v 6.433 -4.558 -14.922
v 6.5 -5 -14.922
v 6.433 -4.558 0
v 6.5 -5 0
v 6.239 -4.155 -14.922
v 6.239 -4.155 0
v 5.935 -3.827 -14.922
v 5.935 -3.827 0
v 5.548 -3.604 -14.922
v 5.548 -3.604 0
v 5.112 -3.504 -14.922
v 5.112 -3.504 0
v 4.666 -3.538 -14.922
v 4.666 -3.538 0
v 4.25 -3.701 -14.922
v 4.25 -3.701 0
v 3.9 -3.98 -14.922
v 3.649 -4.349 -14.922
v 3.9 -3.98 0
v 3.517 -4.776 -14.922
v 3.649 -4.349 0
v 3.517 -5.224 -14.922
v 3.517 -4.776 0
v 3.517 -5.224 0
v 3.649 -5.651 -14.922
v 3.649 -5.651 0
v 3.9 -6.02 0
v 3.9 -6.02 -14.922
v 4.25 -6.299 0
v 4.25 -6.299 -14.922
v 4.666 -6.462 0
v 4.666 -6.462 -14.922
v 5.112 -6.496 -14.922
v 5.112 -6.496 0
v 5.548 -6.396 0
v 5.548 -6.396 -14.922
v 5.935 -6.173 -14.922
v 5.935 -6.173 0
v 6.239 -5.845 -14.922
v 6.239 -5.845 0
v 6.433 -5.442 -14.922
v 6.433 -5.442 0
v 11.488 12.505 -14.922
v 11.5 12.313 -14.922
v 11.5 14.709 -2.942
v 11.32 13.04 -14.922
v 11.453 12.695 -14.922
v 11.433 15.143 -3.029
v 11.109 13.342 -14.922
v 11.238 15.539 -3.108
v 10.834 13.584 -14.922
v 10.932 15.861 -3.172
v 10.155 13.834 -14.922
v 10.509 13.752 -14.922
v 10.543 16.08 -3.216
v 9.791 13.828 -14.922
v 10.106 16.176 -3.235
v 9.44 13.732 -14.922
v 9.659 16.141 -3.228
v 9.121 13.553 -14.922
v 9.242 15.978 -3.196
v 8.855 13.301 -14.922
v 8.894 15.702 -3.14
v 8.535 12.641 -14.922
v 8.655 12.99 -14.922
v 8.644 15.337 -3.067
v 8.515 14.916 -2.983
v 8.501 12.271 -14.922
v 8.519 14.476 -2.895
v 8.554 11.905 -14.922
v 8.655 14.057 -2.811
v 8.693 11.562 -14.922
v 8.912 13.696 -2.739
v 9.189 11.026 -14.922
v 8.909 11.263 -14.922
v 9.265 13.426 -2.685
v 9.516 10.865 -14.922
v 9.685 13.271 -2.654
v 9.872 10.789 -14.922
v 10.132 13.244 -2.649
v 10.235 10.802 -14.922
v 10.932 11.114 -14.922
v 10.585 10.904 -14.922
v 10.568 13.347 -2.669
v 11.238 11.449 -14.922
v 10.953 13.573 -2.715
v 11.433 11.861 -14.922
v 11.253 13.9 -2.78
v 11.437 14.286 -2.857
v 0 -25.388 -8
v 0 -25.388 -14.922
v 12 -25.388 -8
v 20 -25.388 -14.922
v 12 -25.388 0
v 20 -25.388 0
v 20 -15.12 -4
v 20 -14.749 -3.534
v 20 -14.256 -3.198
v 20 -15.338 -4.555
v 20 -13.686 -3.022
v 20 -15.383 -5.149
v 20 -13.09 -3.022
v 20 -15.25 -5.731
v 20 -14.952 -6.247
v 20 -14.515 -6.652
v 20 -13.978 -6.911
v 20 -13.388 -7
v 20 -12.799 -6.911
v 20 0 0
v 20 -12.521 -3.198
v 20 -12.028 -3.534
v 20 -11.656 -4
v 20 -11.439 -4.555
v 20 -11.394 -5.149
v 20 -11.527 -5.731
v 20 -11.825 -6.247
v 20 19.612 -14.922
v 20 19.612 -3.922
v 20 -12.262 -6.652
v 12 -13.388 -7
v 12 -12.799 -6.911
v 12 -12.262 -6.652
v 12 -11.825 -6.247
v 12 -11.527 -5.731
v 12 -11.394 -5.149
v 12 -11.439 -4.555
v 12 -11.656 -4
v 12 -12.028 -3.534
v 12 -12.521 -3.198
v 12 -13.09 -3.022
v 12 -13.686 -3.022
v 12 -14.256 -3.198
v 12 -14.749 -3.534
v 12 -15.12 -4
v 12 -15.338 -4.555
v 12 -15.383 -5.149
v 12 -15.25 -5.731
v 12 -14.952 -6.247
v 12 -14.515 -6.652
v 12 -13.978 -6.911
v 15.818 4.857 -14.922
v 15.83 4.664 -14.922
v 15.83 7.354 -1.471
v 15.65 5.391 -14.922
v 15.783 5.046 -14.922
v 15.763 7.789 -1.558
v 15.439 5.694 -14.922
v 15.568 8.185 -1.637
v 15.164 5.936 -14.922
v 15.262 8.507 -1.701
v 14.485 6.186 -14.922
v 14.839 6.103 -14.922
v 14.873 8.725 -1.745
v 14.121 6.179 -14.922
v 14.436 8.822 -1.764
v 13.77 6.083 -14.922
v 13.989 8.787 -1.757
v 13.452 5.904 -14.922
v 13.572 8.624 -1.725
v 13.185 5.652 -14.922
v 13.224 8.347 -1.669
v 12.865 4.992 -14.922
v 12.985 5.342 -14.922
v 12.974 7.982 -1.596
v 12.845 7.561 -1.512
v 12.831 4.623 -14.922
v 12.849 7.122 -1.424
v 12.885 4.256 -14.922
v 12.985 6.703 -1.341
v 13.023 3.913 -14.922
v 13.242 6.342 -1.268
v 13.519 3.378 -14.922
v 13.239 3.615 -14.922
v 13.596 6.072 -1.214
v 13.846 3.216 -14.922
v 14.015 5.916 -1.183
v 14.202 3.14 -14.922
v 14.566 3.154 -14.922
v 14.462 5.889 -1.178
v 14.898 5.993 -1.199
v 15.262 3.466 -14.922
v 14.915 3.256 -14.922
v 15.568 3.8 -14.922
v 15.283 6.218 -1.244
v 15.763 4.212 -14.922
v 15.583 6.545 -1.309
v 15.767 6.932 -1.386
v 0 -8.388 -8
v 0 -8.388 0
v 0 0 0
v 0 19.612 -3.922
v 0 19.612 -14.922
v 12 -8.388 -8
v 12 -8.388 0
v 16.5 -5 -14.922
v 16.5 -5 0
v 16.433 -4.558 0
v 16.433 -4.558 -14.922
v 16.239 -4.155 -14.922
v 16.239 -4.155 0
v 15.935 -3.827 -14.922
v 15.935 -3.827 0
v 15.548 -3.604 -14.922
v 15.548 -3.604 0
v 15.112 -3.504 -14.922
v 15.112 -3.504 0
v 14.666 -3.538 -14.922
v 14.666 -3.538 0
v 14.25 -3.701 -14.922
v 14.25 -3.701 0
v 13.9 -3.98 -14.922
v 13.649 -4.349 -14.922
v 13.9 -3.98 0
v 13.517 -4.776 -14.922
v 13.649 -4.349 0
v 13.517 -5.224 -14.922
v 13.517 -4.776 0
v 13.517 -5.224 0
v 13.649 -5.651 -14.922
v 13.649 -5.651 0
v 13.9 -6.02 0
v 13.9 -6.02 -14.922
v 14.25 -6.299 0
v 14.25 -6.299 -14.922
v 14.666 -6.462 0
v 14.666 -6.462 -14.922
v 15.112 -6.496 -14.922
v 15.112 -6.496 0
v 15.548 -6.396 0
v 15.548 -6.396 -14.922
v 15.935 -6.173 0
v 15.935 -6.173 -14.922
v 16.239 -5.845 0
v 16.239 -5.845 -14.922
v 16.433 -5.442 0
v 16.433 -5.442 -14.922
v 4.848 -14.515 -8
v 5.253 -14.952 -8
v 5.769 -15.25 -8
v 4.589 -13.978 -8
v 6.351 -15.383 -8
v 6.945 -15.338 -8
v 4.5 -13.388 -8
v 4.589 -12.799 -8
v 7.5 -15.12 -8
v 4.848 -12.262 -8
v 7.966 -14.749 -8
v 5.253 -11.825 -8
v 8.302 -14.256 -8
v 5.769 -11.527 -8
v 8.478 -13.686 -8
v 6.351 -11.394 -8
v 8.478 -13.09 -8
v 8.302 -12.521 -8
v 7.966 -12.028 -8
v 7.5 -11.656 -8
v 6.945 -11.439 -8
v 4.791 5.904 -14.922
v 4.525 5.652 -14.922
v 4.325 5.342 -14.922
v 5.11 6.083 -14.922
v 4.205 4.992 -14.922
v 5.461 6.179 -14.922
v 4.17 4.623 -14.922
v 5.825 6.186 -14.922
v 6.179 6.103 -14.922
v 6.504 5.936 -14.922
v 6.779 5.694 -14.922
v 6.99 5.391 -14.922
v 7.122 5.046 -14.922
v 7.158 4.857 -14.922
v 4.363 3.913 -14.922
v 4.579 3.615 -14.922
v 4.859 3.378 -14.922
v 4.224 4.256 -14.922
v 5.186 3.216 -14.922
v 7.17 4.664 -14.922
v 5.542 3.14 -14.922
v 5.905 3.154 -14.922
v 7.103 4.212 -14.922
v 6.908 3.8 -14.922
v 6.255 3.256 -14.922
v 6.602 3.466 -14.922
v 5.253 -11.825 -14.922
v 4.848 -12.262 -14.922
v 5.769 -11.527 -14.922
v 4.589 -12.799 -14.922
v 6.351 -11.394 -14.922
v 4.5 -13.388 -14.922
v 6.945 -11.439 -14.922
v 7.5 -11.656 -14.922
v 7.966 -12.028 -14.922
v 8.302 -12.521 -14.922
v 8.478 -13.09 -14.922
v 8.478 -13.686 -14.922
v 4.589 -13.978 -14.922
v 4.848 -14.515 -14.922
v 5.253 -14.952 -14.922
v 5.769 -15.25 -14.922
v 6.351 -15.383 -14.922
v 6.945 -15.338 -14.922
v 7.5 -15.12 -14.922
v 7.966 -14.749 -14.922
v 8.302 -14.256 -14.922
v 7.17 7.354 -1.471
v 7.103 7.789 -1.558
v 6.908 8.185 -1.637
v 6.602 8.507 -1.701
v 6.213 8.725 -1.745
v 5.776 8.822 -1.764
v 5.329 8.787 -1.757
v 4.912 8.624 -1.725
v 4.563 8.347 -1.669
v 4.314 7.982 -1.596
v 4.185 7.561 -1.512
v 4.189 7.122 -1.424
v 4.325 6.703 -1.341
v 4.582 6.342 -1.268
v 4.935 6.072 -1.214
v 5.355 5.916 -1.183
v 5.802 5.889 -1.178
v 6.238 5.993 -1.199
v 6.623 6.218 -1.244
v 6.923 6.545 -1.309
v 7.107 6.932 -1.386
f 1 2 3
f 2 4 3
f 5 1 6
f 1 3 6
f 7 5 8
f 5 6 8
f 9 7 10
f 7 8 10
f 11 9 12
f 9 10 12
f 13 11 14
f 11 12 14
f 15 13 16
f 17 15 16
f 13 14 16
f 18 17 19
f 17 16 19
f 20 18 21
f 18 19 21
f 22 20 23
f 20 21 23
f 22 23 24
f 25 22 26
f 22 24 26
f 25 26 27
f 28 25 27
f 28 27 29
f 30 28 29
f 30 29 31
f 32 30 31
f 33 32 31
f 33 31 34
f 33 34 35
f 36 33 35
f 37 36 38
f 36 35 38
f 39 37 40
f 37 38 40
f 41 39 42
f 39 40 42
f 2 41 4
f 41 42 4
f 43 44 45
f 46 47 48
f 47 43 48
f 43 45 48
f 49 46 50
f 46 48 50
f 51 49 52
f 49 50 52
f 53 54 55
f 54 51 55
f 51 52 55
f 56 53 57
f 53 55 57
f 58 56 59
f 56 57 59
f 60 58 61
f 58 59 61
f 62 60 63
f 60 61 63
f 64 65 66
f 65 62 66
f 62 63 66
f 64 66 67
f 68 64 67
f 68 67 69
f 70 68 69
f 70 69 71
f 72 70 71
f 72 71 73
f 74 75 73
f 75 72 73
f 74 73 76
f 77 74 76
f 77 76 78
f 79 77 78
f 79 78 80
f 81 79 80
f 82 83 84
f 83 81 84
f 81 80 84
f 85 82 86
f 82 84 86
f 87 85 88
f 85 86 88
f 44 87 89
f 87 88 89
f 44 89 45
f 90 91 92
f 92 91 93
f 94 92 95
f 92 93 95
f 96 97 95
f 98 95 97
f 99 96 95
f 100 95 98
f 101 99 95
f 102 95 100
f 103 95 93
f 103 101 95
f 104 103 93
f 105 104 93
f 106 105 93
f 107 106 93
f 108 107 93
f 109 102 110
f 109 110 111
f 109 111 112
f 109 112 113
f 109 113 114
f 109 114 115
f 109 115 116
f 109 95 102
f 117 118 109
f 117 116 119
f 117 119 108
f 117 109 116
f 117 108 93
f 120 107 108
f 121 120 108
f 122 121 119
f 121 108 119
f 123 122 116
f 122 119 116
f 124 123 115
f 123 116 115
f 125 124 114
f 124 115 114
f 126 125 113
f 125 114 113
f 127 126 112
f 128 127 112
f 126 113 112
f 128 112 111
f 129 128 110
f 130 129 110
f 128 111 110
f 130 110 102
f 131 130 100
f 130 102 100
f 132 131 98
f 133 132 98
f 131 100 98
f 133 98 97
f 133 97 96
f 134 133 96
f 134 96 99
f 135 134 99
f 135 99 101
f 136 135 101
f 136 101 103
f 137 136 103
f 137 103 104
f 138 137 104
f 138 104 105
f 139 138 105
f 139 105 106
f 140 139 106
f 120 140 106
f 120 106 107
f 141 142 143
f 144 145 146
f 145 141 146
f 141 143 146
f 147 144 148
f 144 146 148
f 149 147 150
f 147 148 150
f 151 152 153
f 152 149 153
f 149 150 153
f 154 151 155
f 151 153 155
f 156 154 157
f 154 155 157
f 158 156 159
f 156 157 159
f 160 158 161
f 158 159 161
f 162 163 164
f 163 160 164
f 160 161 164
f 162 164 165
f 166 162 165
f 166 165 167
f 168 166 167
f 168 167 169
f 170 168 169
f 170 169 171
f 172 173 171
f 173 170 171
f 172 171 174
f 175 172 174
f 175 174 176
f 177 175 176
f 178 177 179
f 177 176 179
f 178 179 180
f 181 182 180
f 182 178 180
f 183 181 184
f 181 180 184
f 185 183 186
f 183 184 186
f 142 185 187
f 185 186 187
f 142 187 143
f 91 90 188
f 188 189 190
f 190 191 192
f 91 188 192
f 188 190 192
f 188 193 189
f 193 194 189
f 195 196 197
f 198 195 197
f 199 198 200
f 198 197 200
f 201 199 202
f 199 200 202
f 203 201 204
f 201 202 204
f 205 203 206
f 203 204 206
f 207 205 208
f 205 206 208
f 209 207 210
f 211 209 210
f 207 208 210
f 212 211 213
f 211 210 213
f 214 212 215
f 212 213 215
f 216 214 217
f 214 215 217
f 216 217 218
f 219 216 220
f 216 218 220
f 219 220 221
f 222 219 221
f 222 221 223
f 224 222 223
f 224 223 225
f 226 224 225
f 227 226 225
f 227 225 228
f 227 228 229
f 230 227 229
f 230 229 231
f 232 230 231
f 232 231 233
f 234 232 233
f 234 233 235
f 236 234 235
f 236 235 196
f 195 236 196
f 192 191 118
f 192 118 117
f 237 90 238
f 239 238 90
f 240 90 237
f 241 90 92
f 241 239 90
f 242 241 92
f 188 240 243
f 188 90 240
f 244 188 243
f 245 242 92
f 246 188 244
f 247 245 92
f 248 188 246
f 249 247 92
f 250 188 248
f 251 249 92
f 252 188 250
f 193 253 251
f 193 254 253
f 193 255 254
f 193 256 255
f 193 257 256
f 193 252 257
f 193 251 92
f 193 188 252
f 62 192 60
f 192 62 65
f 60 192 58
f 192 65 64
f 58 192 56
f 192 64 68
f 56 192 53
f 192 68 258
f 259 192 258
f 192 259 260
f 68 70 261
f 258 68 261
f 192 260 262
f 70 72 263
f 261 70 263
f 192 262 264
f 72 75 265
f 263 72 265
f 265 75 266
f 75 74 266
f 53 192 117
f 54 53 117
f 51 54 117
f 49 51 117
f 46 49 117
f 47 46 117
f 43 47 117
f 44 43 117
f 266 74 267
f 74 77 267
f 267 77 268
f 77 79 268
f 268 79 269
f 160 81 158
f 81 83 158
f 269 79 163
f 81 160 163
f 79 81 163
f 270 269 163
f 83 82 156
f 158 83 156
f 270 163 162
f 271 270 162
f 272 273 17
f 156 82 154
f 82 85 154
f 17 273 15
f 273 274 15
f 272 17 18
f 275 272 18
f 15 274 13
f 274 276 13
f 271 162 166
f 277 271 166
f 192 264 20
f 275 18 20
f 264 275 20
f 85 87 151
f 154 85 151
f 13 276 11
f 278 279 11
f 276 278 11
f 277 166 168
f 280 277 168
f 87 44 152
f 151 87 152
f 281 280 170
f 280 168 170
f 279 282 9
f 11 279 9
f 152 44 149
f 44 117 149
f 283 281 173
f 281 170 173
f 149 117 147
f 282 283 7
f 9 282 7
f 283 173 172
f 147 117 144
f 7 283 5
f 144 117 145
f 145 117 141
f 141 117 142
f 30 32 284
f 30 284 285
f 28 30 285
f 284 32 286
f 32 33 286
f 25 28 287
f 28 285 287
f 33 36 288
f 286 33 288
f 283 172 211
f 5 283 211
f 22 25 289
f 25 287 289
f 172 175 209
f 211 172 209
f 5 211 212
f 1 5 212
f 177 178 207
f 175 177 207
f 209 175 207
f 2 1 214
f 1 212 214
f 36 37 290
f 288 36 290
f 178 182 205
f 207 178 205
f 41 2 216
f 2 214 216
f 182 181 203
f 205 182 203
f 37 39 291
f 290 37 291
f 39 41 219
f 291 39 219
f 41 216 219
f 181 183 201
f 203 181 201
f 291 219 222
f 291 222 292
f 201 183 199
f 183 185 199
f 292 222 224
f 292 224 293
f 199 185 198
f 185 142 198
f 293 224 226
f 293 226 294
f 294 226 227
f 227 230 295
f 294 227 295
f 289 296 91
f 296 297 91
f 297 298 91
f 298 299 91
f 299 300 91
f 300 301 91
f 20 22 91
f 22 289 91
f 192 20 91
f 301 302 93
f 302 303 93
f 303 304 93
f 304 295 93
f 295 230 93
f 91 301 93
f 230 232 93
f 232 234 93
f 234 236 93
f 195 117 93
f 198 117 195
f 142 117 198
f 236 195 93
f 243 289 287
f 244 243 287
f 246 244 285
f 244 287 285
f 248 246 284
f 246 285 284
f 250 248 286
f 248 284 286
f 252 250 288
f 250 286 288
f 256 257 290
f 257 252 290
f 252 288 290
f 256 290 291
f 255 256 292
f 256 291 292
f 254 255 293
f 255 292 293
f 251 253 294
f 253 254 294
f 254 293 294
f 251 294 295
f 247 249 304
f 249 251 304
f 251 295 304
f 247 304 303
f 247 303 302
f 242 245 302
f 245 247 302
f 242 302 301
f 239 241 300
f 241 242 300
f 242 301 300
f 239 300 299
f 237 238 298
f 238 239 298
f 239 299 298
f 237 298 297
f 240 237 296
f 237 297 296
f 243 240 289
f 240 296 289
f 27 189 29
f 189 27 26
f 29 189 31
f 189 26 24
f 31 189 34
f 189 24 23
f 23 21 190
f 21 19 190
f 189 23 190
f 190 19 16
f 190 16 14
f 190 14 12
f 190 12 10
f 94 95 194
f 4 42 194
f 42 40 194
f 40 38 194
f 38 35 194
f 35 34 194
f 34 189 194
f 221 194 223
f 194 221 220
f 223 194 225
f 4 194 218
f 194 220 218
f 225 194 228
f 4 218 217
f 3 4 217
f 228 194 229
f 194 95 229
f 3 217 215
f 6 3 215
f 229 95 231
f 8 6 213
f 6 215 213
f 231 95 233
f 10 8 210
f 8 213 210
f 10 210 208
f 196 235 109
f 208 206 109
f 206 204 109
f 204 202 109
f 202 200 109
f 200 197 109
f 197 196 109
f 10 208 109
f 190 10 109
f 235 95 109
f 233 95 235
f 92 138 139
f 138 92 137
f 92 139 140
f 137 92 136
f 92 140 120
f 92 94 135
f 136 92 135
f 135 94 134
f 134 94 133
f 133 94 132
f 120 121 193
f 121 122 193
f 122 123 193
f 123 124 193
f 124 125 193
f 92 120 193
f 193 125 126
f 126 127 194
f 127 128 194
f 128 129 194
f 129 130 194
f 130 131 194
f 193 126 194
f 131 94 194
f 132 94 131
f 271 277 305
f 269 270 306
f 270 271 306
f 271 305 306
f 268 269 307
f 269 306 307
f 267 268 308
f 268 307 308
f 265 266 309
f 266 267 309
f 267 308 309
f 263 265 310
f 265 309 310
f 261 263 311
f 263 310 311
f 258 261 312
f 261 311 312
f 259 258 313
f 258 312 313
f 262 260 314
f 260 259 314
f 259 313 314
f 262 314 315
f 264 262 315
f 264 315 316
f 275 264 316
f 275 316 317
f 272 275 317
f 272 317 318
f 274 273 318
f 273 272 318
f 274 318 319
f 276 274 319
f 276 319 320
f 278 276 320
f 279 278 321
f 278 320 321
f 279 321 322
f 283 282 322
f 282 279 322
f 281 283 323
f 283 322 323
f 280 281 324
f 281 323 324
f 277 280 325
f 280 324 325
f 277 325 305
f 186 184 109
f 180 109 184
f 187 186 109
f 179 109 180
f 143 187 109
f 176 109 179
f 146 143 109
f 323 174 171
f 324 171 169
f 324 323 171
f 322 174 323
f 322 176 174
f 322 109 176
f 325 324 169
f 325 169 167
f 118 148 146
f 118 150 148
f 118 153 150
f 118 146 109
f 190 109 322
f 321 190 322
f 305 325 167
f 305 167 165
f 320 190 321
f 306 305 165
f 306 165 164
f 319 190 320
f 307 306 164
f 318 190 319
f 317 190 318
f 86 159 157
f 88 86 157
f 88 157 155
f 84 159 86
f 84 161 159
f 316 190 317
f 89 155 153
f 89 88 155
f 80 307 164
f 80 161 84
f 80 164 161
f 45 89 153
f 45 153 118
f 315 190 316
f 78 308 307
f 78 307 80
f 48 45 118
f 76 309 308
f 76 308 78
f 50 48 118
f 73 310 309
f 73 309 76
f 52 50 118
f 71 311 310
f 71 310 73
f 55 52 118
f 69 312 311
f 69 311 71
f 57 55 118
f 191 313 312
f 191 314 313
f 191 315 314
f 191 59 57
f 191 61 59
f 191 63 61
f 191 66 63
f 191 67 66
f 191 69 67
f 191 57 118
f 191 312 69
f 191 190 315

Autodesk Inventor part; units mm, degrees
ref_plane "YZ Plane" through (0, 0, 0) normal (1, 0, 0) x (0, 1, 0)
ref_plane "XZ Plane" through (0, 0, 0) normal (0, 1, 0) x (-1, 0, 0)
ref_plane "XY Plane" through (0, 0, 0) normal (0, 0, 1) x (1, 0, 0)
sketch "Sketch1" plane through (0, 0, 0) normal (1, 0, 0) x (0, 1, 0)
  line L0 (0, 0) -> (19.6116, -3.9223)
  line L1 (0, 0) -> (20, 0) construction
  line L2 (19.6116, -3.9223) -> (19.6116, -14.9223)
  line L3 (19.6116, -14.9223) -> (-10.3884, -14.9223)
  line L4 (-10.3884, -14.9223) -> (-10.3884, 0)
  line L5 (-10.3884, 0) -> (0, 0)
  dimension "d0" = 20
  dimension "d1" = 11.31
  dimension "d2" = 11
  dimension "d3" = 30
extrude "Extrusion1" add sketch "Sketch1" along normal blind 20
sketch "Sketch2" plane through (0, 0, 0) normal (0, 0.1961, 0.9806) x (1, 0, 0)
  line L0 (0, 0) -> (10, 0)
  line L1 (0, 0) -> (20, 0) projected
  line L2 (10, 0) -> (10, 15)
  circle A0 centre (10, 15) radius 1.5
  line L3 (10, 15) -> (10, 10)
  circle A1 centre (5.6699, 7.5) radius 1.5
  circle A2 centre (14.3301, 7.5) radius 1.5
  dimension "d6" = 15
  dimension "d7" = 3
  dimension "d8" = 5
  dimension "d11" = 360
extrude "Extrusion2" cut sketch "Sketch2" against normal blind 20
sketch "Sketch3" plane through (0, -10.3884, 0) normal (0, 0, 1) x (1, 0, 0)
  line L0 (0, 10.3884) -> (0, 0) projected
  line L1 (0, 10.3884) -> (0, 5.3884)
  line L2 (0, 5.3884) -> (5, 5.3884)
  line L3 (5, 5.3884) -> (15, 5.3884)
  circle A0 centre (5, 5.3884) radius 1.5
  circle A1 centre (15, 5.3884) radius 1.5
  dimension "d15" = 5
  dimension "d16" = 5
  dimension "d17" = 10
  dimension "d18" = 3
  dimension "d19" = 3
extrude "Extrusion3" cut sketch "Sketch3" against normal blind 20
sketch "Sketch4" plane through (20, 0, 0) normal (1, 0, 0) x (0, 0, -1)
  line L0 (14.9223, -10.3884) -> (14.9223, 19.6116) projected
  line L1 (0, -10.3884) -> (14.9223, -10.3884) projected
  line L2 (14.9223, -10.3884) -> (0, -10.3884)
  point P0 (0, 0)
sketch "Sketch5" plane through (20, 0, 0) normal (1, 0, 0) x (0, 0, -1)
  line L0 (0, 0) -> (0, -10.3884) projected
  line L1 (0, -10.3884) -> (14.9223, -10.3884)
  line L2 (14.9223, -10.3884) -> (14.9223, -25.3884)
  line L3 (14.9223, -25.3884) -> (0, -25.3884)
  line L4 (0, -25.3884) -> (0, -10.3884)
  dimension "d22" = 15
  dimension "d25" = 14.9223
extrude "Extrusion4" add sketch "Sketch5" against normal blind 20
sketch "Sketch10" plane through (0, 0, 0) normal (0, 0, 1) x (1, 0, 0)
  line L0 (0, -25.3884) -> (0, 19.6116) projected
  line L1 (0, -25.3884) -> (12, -25.3884)
  line L2 (12, -25.3884) -> (12, -8.3884)
  line L3 (12, -8.3884) -> (0, -8.3884)
  line L4 (0, -8.3884) -> (0, -25.3884)
  point P0 (0, 0)
  point P1 (0, -8.3884)
  dimension "d39" = 12
  dimension "d40" = 17
extrude "Extrusion8" cut sketch "Sketch10" against normal blind 8
sketch "Sketch11" plane through (20, 0, 0) normal (1, 0, 0) x (0, 0, -1)
  line L0 (0, -25.3884) -> (8, -25.3884) projected
  line L1 (0, -25.3884) -> (5, -25.3884)
  line L2 (5, -25.3884) -> (5, -13.3884)
  circle A0 centre (5, -13.3884) radius 2
  point P0 (0, 0)
  dimension "d43" = 5
  dimension "d44" = 12
  dimension "d45" = 4
extrude "Extrusion9" cut sketch "Sketch11" against normal blind 8
sketch "Sketch12" plane through (20, 19.6116, -14.9223) normal (0, 0, -1) x (-1, 0, 0)
  line L0 (20, -45) -> (20, 0) projected
  line L1 (20, -45) -> (13.5, -45)
  line L2 (8, -45) -> (20, -45) projected
  line L3 (13.5, -45) -> (13.5, -33)
  circle A0 centre (13.5, -33) radius 2
  point P0 (20, -19.6116)
  dimension "d48" = 6.5
  dimension "d49" = 12
  dimension "d50" = 4
extrude "Extrusion10" cut sketch "Sketch12" against normal blind 8
properties part number "connector"
